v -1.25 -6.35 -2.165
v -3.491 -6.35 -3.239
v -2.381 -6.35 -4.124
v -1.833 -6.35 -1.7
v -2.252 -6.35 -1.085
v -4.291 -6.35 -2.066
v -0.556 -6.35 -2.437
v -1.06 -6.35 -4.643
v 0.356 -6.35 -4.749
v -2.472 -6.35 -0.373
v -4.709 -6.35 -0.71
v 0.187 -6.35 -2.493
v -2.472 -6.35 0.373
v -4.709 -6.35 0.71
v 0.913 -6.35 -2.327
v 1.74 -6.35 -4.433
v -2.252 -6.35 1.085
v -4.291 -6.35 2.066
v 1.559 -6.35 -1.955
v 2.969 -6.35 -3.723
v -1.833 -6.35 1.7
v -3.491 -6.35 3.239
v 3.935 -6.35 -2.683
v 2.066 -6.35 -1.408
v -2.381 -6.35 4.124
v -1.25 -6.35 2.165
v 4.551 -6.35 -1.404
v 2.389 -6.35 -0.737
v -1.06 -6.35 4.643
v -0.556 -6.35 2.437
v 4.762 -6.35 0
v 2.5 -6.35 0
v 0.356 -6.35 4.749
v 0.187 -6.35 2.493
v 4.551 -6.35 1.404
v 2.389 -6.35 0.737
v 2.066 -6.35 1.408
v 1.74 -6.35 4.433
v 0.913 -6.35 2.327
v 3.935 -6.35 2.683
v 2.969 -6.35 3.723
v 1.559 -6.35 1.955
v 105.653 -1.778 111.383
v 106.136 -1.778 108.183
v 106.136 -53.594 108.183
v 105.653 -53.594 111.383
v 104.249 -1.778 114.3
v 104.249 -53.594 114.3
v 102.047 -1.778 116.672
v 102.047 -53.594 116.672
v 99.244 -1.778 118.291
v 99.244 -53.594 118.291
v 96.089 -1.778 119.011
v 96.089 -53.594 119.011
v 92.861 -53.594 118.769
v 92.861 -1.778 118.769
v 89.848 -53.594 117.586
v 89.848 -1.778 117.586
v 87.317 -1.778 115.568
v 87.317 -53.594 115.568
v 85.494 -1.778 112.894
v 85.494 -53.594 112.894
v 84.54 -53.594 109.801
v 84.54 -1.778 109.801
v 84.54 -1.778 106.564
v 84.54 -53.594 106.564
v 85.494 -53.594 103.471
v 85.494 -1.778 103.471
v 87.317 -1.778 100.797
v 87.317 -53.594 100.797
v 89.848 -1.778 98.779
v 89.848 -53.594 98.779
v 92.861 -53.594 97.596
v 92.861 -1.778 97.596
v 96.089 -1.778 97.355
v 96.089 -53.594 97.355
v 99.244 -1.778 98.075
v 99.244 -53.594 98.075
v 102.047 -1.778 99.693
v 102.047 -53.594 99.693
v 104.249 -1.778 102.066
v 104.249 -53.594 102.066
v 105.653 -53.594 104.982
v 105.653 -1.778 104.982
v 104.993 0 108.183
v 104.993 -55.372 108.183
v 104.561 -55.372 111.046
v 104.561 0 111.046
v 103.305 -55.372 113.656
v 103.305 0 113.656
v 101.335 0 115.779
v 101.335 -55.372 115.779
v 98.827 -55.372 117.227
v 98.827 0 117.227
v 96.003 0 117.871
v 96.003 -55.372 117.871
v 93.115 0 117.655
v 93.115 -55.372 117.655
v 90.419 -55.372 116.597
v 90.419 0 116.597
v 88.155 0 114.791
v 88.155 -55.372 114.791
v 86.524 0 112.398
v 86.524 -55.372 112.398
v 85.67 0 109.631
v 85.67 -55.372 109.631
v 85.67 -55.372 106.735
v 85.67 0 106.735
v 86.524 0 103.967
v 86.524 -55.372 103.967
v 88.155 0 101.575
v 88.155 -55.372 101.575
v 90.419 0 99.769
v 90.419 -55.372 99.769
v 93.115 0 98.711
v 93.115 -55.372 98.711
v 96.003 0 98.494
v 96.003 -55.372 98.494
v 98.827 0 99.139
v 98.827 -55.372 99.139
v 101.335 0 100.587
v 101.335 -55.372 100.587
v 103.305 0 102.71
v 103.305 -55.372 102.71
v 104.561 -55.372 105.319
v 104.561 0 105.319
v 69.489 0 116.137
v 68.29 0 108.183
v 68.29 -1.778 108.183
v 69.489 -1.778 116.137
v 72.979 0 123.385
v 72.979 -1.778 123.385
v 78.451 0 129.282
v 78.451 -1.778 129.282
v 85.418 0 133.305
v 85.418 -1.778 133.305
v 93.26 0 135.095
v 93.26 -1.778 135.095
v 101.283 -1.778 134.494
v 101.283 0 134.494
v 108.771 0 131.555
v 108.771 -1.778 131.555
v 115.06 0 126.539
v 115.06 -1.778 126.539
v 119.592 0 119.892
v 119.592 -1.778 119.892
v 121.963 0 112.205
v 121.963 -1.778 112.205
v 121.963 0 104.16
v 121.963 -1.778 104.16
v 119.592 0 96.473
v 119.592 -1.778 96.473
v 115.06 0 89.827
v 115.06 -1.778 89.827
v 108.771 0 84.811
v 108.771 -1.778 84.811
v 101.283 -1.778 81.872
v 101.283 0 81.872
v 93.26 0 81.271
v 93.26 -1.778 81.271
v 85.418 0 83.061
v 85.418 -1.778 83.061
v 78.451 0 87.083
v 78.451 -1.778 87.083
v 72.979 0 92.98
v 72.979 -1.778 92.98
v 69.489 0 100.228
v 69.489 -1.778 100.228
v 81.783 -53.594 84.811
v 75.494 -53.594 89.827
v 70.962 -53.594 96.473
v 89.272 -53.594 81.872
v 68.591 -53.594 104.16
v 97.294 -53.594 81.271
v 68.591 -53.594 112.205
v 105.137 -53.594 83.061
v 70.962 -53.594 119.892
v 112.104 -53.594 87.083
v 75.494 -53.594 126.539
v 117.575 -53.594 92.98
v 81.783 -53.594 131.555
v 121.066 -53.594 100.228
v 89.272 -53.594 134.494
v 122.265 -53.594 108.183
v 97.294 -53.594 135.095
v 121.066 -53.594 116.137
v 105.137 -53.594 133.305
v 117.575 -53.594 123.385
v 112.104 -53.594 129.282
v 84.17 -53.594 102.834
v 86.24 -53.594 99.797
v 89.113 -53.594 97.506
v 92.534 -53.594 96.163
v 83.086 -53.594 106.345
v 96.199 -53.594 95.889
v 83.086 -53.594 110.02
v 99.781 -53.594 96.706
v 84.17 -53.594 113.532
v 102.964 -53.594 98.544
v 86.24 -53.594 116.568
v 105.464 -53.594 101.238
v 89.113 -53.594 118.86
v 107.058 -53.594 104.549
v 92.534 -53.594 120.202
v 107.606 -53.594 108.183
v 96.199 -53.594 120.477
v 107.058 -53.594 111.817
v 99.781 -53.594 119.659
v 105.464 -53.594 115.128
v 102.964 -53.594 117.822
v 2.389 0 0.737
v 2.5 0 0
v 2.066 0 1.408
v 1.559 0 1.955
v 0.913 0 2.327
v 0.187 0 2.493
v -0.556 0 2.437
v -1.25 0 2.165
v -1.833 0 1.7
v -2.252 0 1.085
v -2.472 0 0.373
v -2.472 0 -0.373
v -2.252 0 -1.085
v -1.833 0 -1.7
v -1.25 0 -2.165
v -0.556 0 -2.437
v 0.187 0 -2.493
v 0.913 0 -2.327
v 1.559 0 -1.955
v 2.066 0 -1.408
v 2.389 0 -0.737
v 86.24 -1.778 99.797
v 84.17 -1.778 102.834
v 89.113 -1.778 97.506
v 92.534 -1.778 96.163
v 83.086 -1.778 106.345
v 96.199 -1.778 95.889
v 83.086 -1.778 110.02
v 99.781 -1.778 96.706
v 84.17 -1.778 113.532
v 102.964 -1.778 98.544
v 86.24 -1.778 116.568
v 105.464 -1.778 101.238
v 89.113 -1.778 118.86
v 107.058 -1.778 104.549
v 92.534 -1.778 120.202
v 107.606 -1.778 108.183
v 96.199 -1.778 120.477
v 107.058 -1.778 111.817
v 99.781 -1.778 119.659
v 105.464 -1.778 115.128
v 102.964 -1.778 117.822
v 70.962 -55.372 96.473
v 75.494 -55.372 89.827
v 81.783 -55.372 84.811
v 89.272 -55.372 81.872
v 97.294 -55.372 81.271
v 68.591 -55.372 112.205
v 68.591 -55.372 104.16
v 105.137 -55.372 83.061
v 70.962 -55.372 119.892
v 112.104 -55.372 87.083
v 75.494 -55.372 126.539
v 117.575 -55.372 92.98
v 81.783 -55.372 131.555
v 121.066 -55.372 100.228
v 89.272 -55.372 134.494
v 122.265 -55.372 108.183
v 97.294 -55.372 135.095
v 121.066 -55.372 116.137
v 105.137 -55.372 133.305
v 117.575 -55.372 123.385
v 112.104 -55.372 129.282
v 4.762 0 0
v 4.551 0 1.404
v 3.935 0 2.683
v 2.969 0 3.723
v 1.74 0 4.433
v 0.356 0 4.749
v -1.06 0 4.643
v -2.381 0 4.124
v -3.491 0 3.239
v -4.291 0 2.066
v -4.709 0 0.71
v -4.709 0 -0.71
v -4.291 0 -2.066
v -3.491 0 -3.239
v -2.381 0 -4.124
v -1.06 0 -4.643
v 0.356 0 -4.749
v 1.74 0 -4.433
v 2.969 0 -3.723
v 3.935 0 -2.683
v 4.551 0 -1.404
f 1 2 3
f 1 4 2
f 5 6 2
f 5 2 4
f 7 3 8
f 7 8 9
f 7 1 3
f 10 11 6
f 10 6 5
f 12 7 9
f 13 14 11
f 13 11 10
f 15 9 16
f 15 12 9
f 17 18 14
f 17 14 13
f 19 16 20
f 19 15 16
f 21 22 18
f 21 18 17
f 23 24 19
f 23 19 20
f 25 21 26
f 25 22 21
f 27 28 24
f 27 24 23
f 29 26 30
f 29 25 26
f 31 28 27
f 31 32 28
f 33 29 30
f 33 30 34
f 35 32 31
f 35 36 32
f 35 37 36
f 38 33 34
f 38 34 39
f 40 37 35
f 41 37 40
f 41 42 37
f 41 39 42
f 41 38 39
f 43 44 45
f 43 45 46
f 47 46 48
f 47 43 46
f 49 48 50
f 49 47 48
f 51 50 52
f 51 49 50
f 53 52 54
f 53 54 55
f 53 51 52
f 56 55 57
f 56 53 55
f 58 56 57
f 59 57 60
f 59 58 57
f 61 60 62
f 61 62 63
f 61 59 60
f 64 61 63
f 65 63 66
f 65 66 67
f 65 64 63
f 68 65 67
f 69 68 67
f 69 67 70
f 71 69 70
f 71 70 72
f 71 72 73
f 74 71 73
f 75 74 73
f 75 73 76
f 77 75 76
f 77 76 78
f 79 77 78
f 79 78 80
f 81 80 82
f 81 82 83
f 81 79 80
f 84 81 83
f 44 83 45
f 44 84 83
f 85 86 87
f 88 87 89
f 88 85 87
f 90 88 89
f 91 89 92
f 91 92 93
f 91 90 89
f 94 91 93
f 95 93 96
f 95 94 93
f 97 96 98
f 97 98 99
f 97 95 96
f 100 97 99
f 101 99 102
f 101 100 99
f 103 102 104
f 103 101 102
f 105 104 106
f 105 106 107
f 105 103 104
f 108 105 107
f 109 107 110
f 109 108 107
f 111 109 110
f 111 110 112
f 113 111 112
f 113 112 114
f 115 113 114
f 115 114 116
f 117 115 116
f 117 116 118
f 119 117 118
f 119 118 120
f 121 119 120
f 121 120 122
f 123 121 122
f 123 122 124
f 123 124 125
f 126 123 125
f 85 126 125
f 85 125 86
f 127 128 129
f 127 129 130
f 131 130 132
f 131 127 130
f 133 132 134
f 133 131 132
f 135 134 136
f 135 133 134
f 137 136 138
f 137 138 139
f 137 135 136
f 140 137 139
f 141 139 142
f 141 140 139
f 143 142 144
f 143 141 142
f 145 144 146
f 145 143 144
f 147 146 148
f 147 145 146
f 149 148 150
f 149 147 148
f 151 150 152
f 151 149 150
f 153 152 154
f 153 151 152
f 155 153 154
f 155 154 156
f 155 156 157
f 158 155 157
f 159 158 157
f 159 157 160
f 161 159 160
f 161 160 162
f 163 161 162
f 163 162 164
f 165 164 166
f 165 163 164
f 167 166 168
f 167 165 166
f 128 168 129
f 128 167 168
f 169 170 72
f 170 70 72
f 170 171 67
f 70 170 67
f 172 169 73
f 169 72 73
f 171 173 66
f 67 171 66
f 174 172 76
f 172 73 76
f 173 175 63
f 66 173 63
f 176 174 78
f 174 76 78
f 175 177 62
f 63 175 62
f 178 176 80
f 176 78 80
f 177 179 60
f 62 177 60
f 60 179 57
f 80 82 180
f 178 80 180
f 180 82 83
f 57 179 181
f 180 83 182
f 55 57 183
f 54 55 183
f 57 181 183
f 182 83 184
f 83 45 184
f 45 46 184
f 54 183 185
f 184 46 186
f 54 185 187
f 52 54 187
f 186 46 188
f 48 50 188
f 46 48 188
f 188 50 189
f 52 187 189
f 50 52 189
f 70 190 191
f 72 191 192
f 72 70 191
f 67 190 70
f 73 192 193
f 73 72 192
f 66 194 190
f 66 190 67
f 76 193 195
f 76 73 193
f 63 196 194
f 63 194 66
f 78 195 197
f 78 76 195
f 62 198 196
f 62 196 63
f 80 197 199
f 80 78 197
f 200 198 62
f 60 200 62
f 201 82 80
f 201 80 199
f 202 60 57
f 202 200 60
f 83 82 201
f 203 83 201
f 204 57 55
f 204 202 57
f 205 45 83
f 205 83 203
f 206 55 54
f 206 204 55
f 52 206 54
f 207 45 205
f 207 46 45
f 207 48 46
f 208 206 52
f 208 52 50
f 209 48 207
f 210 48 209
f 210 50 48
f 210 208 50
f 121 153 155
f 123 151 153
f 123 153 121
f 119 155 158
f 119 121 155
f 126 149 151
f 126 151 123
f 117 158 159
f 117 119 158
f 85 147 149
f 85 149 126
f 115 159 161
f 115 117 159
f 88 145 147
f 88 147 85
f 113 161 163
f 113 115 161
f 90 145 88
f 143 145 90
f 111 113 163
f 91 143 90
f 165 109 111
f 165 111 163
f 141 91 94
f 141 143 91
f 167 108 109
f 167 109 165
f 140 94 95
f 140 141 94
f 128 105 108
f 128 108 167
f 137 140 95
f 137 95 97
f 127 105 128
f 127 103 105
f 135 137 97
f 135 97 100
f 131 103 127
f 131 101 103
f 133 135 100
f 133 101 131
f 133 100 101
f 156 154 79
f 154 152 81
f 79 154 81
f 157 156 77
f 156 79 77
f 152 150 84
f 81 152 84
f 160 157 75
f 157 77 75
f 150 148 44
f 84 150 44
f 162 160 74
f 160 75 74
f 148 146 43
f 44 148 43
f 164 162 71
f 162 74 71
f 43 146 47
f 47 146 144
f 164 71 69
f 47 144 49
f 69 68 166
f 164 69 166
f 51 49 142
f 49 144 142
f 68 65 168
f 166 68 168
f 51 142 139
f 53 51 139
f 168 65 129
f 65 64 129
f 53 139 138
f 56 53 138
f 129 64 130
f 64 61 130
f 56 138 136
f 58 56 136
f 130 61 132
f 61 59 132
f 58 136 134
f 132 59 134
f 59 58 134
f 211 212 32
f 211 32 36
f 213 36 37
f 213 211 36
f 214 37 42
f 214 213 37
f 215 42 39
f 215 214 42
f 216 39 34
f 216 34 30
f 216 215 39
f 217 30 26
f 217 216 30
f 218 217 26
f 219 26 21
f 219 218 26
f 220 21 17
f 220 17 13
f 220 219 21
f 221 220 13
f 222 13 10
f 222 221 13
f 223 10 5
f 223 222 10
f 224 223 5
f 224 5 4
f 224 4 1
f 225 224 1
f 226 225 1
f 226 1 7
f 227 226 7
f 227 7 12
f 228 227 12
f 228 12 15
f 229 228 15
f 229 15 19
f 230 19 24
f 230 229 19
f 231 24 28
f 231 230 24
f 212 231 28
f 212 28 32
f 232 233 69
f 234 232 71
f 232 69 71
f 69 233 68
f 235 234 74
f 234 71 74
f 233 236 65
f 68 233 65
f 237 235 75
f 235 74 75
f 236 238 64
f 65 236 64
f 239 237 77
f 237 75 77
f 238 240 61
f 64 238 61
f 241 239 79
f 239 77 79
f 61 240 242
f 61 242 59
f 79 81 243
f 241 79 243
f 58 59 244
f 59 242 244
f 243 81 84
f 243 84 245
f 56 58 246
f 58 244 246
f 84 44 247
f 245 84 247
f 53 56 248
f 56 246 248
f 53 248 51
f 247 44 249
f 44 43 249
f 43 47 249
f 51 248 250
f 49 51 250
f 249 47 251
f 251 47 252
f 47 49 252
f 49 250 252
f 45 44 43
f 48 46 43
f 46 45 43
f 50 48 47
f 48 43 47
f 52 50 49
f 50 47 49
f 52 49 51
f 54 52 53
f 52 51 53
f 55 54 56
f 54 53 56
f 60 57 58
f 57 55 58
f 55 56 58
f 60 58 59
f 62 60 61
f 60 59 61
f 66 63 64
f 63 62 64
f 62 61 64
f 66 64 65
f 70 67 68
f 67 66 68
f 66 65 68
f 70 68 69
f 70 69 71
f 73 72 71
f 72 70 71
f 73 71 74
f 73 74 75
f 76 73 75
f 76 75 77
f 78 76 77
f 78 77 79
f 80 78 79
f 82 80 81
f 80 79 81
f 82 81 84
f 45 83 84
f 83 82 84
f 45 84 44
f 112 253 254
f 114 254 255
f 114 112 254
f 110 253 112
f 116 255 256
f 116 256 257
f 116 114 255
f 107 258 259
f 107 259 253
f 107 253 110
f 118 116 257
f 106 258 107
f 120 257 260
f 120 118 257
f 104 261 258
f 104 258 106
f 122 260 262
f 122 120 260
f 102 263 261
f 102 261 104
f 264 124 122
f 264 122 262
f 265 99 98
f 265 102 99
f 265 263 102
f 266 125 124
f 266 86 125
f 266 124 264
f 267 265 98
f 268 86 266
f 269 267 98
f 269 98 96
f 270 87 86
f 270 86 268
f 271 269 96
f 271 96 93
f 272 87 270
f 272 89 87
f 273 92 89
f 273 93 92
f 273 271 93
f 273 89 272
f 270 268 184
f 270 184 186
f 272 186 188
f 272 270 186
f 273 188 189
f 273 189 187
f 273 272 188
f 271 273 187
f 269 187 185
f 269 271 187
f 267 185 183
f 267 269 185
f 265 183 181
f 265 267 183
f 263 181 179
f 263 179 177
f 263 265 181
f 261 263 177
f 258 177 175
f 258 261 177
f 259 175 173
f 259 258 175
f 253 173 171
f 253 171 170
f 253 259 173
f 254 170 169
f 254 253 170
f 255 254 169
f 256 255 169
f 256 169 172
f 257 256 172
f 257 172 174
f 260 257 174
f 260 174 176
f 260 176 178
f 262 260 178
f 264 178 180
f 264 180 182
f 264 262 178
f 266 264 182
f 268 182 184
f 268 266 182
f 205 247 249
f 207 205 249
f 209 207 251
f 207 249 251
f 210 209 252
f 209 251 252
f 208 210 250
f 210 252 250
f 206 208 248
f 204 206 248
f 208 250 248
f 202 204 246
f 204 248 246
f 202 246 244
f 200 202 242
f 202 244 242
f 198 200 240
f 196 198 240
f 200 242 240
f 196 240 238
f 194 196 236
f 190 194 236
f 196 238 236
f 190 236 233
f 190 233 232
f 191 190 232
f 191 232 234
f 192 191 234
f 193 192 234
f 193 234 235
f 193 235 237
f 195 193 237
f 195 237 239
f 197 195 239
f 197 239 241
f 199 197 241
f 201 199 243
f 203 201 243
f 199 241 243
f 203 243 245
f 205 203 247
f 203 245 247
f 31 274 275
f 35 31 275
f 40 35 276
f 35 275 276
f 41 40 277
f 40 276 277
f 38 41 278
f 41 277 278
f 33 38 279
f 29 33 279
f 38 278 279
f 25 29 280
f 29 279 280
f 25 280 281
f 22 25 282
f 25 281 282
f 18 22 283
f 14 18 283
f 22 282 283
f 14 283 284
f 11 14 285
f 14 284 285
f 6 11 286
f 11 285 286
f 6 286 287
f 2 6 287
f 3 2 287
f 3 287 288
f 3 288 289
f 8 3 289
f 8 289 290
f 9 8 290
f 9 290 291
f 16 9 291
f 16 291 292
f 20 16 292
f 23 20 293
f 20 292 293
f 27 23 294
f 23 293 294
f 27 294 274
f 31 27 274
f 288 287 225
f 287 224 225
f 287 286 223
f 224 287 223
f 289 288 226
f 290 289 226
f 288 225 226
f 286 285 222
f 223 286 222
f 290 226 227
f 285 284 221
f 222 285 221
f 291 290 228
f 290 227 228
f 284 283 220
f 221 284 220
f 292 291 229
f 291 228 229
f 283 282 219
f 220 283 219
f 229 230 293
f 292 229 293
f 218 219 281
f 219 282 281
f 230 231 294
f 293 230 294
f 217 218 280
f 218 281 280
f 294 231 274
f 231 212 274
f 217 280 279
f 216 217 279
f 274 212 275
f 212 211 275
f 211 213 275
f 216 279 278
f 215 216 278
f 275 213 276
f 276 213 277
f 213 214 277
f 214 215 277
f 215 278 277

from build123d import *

# Parameters (mm, degrees)
F0_R     = 4.7625
F0_R_2   = 2.5
F1_DEPTH = 6.35
F2_R     = 10.8585
F2_R_2   = 9.7155
F3_DEPTH = 55.372
F4_R     = 26.9875
F4_R_2   = 9.7155
F5_DEPTH = 1.778
F6_R     = 26.9875
F6_R_2   = 9.7155
F7_DEPTH = 1.778
F8_R     = 12.328577
F8_R_2   = 10.8585
F9_DEPTH = 51.816


with BuildPart() as f1:
    # F0 (on Front) → F1 (new body)
    with BuildSketch(Plane.XZ):
        Circle(F0_R)
        Circle(F0_R_2, mode=Mode.SUBTRACT)
    extrude(amount=F1_DEPTH)


with BuildPart() as f3:
    # F2 (on Front) → F3 (new body)
    with BuildSketch(Plane.XZ):
        with Locations((95.277227, 108.182721)):
            Circle(F2_R)
        with Locations((95.277227, 108.182721)):
            Circle(F2_R_2, mode=Mode.SUBTRACT)
    extrude(amount=F3_DEPTH)

    # F4 (on face) → F5 (join)
    with BuildSketch(Plane.XZ.offset(55.372)):
        with Locations((95.277227, 108.182721)):
            Circle(F4_R)
        with Locations((95.277227, 108.182721)):
            Circle(F4_R_2, mode=Mode.SUBTRACT)
    extrude(amount=-F5_DEPTH)

    # F6 (on face) → F7 (join)
    with BuildSketch(Plane(origin=(0, 0, 0), x_dir=(-1, 0, 0), z_dir=(0, 1, 0))):
        with Locations((-95.277227, 108.182721)):
            Circle(F6_R)
        with Locations((-95.277227, 108.182721)):
            Circle(F6_R_2, mode=Mode.SUBTRACT)
    extrude(amount=-F7_DEPTH)


with BuildPart() as f9:
    # F8 (on face) → F9 (new body, through all)
    with BuildSketch(Plane.XZ.offset(1.778)):
        with Locations((95.277227, 108.182721)):
            Circle(F8_R)
        with Locations((95.277227, 108.182721)):
            Circle(F8_R_2, mode=Mode.SUBTRACT)
    extrude(amount=F9_DEPTH)


solid = Compound([f1.part, f3.part, f9.part])
